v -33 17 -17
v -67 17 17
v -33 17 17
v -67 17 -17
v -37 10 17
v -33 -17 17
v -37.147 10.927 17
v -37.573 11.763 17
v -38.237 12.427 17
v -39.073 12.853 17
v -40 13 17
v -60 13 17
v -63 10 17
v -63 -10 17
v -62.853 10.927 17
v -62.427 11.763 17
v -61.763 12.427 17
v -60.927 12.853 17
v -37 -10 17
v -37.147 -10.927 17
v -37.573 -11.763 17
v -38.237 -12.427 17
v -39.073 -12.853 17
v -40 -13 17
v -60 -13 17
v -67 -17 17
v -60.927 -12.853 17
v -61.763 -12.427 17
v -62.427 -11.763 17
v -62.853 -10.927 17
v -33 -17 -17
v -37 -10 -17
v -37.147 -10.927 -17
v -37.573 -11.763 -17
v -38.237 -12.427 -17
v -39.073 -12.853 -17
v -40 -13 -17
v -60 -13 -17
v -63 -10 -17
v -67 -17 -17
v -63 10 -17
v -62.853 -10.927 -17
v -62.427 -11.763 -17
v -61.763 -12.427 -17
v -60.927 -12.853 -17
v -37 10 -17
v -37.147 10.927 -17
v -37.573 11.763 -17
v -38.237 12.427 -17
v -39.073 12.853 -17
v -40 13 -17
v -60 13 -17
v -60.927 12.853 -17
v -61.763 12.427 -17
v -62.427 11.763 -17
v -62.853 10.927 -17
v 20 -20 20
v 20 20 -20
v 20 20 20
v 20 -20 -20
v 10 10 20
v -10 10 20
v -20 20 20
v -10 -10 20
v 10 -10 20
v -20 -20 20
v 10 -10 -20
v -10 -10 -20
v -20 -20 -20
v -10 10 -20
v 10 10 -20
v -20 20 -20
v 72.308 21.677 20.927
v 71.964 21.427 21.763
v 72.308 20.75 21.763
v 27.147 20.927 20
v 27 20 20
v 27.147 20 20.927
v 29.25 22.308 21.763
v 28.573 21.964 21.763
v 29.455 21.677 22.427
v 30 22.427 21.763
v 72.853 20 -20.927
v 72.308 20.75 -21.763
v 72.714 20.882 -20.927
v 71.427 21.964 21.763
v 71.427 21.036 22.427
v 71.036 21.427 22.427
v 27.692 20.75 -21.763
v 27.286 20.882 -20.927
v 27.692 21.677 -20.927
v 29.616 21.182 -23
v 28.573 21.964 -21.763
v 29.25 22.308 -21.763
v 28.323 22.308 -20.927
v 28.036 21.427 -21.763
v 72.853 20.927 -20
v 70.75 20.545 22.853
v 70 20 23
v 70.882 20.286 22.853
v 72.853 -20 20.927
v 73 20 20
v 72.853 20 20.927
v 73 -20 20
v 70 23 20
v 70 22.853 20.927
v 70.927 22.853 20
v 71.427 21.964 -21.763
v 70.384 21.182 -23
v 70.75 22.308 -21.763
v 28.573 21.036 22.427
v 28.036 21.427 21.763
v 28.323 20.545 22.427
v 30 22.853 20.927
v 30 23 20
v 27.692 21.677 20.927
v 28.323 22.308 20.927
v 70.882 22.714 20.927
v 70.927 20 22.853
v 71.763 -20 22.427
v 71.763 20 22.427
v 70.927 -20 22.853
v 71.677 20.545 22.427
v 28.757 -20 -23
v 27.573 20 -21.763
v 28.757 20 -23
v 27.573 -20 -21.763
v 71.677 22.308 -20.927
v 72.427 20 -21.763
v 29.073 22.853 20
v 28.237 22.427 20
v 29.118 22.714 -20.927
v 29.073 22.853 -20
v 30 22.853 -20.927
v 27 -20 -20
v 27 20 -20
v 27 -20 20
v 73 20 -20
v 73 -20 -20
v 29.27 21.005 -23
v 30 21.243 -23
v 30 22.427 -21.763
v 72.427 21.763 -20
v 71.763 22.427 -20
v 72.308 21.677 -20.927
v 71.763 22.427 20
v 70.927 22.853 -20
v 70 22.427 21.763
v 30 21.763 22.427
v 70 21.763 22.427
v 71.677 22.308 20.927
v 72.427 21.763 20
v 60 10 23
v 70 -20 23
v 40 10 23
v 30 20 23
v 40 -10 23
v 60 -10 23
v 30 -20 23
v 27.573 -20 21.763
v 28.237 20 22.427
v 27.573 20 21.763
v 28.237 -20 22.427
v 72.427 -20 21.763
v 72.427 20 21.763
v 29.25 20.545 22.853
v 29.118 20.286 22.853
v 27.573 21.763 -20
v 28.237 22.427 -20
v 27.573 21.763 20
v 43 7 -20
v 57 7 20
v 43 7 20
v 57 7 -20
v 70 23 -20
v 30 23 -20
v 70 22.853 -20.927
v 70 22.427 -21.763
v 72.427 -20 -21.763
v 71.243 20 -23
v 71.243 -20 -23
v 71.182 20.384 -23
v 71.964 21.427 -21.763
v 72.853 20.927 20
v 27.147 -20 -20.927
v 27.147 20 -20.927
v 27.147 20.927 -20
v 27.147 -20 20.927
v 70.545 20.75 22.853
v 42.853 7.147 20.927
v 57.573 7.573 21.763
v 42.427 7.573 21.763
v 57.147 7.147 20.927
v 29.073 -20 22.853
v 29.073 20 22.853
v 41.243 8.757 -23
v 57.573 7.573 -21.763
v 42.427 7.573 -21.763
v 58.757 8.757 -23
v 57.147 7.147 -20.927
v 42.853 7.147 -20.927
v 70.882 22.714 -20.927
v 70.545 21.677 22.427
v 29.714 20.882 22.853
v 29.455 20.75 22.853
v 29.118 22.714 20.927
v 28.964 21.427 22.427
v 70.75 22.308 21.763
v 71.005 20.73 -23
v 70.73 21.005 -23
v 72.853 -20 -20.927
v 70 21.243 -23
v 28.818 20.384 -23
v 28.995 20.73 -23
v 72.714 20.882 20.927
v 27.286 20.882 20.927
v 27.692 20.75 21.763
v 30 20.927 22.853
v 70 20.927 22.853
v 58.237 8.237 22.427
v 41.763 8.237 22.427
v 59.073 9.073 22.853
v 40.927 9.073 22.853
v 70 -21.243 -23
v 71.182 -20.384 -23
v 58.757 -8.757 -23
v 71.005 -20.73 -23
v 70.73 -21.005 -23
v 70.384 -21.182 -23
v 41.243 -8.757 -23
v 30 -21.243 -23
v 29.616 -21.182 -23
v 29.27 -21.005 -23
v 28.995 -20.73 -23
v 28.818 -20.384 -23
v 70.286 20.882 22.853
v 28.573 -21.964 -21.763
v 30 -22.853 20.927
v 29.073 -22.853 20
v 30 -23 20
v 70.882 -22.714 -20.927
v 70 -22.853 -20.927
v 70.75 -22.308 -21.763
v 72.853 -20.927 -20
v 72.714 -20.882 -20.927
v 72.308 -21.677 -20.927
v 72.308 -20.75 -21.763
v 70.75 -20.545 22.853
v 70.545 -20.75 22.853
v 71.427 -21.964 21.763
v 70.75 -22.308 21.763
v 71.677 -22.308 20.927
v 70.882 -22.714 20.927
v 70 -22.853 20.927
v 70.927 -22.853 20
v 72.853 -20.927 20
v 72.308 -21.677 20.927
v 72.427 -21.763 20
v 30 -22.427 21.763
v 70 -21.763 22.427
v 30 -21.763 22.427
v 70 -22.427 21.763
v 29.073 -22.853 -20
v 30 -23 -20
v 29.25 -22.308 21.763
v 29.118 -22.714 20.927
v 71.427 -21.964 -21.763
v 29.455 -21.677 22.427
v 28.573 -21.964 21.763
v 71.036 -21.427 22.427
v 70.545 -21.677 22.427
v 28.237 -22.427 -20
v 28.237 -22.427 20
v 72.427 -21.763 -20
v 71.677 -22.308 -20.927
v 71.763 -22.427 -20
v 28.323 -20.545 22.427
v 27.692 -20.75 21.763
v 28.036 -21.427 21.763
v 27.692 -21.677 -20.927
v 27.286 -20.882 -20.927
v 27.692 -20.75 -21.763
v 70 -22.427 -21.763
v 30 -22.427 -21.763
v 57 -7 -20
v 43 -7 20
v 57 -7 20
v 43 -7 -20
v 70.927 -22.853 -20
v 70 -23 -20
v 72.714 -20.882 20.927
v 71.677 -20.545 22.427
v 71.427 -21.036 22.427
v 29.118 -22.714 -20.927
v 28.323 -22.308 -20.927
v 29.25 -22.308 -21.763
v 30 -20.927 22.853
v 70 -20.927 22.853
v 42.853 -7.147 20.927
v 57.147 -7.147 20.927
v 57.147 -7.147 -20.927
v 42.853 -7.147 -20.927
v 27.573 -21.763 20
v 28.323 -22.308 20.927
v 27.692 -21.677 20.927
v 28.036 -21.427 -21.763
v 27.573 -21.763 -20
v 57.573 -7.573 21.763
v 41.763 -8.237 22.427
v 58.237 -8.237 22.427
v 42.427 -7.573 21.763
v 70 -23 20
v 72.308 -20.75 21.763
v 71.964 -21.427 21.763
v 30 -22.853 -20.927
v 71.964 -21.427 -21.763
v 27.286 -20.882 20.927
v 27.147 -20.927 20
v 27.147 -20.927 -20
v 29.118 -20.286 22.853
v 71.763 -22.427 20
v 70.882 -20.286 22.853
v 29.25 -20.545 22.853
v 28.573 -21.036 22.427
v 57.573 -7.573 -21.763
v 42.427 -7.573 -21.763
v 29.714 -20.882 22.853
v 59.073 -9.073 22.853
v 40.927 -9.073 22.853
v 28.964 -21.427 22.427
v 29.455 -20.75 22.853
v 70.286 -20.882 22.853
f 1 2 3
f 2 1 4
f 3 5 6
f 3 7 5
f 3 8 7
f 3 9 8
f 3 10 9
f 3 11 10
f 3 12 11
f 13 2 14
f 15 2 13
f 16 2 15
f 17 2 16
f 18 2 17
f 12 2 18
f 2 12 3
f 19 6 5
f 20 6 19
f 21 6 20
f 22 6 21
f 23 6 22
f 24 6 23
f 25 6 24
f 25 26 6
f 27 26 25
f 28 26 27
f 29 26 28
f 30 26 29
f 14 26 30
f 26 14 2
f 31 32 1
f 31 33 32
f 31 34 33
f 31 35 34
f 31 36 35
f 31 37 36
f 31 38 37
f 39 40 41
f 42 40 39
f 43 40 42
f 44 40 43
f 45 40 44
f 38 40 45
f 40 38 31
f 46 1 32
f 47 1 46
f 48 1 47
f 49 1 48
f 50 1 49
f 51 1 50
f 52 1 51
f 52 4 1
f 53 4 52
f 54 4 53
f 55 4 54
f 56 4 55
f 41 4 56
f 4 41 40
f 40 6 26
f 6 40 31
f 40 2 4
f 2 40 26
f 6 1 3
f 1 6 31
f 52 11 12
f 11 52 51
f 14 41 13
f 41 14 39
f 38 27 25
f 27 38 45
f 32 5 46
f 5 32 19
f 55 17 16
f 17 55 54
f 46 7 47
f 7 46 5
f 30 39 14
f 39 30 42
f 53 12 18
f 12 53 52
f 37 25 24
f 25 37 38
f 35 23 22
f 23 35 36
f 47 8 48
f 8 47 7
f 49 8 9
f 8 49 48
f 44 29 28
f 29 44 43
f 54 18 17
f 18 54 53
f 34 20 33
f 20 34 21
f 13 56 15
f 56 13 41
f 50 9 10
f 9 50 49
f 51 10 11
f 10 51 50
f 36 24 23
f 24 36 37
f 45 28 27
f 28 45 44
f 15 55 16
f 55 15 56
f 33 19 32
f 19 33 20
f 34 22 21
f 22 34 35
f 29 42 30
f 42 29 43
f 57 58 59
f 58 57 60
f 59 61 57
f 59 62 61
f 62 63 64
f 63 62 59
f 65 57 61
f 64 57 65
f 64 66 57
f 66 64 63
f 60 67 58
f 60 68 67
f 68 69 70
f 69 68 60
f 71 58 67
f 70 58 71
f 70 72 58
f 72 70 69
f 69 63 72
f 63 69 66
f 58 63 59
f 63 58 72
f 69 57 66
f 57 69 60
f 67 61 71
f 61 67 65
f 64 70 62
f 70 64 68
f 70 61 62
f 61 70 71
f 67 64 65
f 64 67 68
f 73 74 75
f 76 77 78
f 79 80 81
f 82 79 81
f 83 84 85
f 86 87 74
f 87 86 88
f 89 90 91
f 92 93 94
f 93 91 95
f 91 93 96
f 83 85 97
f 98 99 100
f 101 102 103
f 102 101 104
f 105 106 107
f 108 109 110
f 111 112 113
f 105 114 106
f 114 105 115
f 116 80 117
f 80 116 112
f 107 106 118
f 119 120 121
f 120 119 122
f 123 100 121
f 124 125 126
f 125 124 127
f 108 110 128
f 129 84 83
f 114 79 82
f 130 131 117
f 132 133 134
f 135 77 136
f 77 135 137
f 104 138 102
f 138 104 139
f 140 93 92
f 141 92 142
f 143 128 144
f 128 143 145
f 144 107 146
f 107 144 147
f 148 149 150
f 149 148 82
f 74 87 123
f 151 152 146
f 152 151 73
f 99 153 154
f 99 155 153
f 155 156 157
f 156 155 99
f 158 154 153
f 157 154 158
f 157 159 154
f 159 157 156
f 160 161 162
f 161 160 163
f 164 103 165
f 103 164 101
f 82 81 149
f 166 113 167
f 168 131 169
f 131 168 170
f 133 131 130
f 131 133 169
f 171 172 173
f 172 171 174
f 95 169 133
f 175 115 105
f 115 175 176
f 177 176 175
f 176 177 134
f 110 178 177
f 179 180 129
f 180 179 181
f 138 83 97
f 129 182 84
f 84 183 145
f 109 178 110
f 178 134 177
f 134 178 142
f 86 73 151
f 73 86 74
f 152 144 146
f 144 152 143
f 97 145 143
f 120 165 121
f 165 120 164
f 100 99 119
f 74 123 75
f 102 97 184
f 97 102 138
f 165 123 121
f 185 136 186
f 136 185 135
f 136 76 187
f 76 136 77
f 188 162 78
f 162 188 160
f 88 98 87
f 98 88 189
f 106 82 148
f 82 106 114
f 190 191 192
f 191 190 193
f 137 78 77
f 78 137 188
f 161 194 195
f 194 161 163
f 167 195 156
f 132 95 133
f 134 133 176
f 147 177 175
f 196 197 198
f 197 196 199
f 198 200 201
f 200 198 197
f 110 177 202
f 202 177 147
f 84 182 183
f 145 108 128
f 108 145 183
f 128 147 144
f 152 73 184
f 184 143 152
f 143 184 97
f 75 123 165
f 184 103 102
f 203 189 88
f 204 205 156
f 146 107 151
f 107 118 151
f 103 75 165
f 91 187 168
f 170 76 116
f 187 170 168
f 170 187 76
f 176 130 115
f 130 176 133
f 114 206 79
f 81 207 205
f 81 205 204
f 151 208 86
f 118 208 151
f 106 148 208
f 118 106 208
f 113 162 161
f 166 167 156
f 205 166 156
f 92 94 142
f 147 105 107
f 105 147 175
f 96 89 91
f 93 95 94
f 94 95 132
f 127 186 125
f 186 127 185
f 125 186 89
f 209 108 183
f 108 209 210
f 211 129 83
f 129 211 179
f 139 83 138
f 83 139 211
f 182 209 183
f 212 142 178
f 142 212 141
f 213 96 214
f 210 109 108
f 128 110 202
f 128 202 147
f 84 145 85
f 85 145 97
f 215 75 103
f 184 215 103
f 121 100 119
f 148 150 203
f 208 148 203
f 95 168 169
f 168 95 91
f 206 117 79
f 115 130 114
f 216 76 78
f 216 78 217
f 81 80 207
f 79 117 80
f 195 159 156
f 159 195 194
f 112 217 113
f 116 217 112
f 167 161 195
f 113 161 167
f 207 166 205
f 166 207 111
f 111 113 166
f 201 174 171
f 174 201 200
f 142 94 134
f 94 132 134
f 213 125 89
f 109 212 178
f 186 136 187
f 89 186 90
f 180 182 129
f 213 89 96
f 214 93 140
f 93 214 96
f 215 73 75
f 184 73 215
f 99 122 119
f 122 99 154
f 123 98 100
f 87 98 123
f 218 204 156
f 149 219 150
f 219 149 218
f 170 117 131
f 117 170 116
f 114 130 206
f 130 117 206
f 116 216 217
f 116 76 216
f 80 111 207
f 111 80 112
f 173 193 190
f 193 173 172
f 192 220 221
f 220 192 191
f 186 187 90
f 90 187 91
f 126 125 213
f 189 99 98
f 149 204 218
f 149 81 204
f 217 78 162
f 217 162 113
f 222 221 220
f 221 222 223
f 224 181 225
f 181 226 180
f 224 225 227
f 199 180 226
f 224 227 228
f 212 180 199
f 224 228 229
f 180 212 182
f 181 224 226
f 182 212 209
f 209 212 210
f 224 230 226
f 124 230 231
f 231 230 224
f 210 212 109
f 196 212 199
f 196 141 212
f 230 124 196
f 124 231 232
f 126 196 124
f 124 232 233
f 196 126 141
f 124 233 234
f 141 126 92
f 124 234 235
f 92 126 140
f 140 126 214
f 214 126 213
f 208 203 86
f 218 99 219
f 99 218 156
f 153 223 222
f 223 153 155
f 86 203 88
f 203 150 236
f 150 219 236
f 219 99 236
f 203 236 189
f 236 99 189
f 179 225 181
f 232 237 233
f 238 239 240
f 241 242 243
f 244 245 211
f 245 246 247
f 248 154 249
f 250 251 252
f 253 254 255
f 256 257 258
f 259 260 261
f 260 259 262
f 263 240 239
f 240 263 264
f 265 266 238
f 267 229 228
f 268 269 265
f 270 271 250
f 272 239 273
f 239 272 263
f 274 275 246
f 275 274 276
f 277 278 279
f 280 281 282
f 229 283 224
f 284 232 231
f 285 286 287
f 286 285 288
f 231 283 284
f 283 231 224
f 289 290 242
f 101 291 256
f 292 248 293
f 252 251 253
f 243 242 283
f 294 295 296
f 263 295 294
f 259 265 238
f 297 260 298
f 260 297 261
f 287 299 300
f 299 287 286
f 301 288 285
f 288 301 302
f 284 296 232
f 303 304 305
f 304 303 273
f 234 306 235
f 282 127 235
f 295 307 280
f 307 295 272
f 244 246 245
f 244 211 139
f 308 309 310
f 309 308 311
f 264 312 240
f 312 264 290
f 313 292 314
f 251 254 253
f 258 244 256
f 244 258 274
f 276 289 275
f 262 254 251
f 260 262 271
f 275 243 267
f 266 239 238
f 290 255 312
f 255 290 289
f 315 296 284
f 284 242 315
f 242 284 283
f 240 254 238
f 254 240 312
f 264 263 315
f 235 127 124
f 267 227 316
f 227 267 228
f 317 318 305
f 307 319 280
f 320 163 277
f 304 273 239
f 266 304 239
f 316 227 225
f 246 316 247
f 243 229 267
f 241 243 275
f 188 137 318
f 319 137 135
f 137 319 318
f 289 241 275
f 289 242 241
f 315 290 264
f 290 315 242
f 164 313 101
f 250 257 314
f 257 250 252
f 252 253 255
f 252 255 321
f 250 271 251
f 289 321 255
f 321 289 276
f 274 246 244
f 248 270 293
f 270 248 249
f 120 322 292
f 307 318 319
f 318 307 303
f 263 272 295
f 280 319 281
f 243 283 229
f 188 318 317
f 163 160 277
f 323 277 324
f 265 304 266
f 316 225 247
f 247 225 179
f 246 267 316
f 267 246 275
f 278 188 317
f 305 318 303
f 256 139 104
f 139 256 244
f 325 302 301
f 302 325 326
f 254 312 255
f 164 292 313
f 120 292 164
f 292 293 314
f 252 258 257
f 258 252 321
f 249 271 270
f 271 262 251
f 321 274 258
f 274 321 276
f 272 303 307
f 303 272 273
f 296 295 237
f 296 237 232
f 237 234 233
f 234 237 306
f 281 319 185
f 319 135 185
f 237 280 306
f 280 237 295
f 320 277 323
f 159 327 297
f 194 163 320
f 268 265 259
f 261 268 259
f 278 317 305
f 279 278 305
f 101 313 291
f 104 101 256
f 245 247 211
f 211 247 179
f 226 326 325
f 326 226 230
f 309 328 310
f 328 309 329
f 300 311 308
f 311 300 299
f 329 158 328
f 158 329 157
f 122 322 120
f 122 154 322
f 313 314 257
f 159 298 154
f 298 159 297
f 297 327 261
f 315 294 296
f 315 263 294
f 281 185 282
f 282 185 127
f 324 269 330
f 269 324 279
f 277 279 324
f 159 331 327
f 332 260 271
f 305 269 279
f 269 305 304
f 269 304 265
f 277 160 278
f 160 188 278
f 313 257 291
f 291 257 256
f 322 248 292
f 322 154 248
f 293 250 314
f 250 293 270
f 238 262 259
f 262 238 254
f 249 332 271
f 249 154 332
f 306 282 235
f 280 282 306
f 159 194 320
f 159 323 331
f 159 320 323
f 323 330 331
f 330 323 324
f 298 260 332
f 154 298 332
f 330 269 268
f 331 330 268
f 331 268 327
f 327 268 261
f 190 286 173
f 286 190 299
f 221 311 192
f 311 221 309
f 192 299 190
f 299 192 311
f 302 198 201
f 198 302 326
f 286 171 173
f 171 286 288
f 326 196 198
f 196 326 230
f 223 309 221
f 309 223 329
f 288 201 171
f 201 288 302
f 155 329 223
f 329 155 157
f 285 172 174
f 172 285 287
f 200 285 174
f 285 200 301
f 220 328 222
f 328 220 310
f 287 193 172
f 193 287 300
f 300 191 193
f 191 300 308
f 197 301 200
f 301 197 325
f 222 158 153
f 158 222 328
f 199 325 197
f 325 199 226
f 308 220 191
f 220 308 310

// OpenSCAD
// file: ../utils/core/clip.scad
//
// NopSCADlib Copyright Chris Palmer 2018
// nop.head@gmail.com
// hydraraptor.blogspot.com
//
// This file is part of NopSCADlib.
//
// NopSCADlib is free software: you can redistribute it and/or modify it under the terms of the
// GNU General Public License as published by the Free Software Foundation, either version 3 of
// the License, or (at your option) any later version.
//
// NopSCADlib is distributed in the hope that it will be useful, but WITHOUT ANY WARRANTY;
// without even the implied warranty of MERCHANTABILITY or FITNESS FOR A PARTICULAR PURPOSE.
// See the GNU General Public License for more details.
//
// You should have received a copy of the GNU General Public License along with NopSCADlib.
// If not, see <https://www.gnu.org/licenses/>.
//

//
//! Construct arbirarily large box to partition 3D space and clip objects, useful for creating cross sections to see the inside when debugging.
//!
//! Original version by Doug Moen on the OpenSCAD forum
//
//
module box(xmin, ymin, zmin, xmax, ymax, zmax) //! Construct a box given its bounds
    polyhedron(
        [[xmin, ymin, zmin],  // 0
         [xmin, ymin, zmax],  // 1
         [xmin, ymax, zmin],  // 2
         [xmin, ymax, zmax],  // 3
         [xmax, ymin, zmin],  // 4
         [xmax, ymin, zmax],  // 5
         [xmax, ymax, zmin],  // 6
         [xmax, ymax, zmax]], // 7
        [[7,5,1,3],  // top
         [2,0,4,6],  // bottom
         [5,4,0,1],  // front
         [3,2,6,7],  // back
         [5,7,6,4],  // right
         [0,2,3,1]]  // left
    );

module clip(xmin = -inf, ymin = -inf, zmin = -inf, xmax = inf, ymax = inf, zmax = inf) //! Clip child to specified boundaries
    render() intersection() {
        children();

        box(xmin, ymin, zmin, xmax, ymax, zmax);
    }
// file: ../utils/core/rounded_rectangle.scad
//
// NopSCADlib Copyright Chris Palmer 2018
// nop.head@gmail.com
// hydraraptor.blogspot.com
//
// This file is part of NopSCADlib.
//
// NopSCADlib is free software: you can redistribute it and/or modify it under the terms of the
// GNU General Public License as published by the Free Software Foundation, either version 3 of
// the License, or (at your option) any later version.
//
// NopSCADlib is distributed in the hope that it will be useful, but WITHOUT ANY WARRANTY;
// without even the implied warranty of MERCHANTABILITY or FITNESS FOR A PARTICULAR PURPOSE.
// See the GNU General Public License for more details.
//
// You should have received a copy of the GNU General Public License along with NopSCADlib.
// If not, see <https://www.gnu.org/licenses/>.
//

//
//! Rectangle with rounded corners.
//
module rounded_square(size, r, center = true) //! Like ```square()``` but with with rounded corners
{
    $fn = r2sides4n(r);
    offset(r) offset(-r) square(size, center = center);
}

module rounded_rectangle(size, r, center = true, xy_center = true) //! Like ```cube()``` but corners rounded in XY plane and separate centre options for xy and z.
{
    linear_extrude(height = size[2], center = center)
        rounded_square([size[0], size[1]], r, xy_center);
}
// file: ../utils/core/teardrops.scad
//
// NopSCADlib Copyright Chris Palmer 2018
// nop.head@gmail.com
// hydraraptor.blogspot.com
//
// This file is part of NopSCADlib.
//
// NopSCADlib is free software: you can redistribute it and/or modify it under the terms of the
// GNU General Public License as published by the Free Software Foundation, either version 3 of
// the License, or (at your option) any later version.
//
// NopSCADlib is distributed in the hope that it will be useful, but WITHOUT ANY WARRANTY;
// without even the implied warranty of MERCHANTABILITY or FITNESS FOR A PARTICULAR PURPOSE.
// See the GNU General Public License for more details.
//
// You should have received a copy of the GNU General Public License along with NopSCADlib.
// If not, see <https://www.gnu.org/licenses/>.
//

//
//! For making horizontal holes that don't need support material.
//! Small holes can get away without it, but they print better with truncated teardrops.
//
module teardrop(h, r, center = true, truncate = true) //! For making horizontal holes that don't need support material, set ```truncate = false``` to make traditional RepRap teardrops that don't even need bridging
    render(convexity = 5)
        extrude_if(h, center)
           hull() {
                circle4n(r);

                if(truncate)
                    translate([0, r / 2])
                        square([2 * r * (sqrt(2) - 1), r], center = true);
                else
                    polygon([[0, 0], [eps, 0], [0, r * sqrt(2)]]);
            }

module teardrop_plus(h, r, center = true, truncate = true) //! Slightly bigger teardrop to allow for the 3D printing staircase effect
    teardrop(h, r + layer_height / 4, center, truncate);

module tearslot(h, r, w, center = true) //! A horizontal slot that doesn't need support material
    extrude_if(h, center)
        hull() {
            translate([-w/2,0,0]) teardrop(r = r, h = 0);
            translate([ w/2,0,0]) teardrop(r = r, h = 0);
        }

module vertical_tearslot(h, r, l, center = true) //! A vertical slot that doesn't need support material
    extrude_if(h, center)
        hull() {
            translate([0,  l / 2]) teardrop(0, r, true);
            translate([0, -l / 2])
                circle4n(r);
        }
// file: ../utils/core/polyholes.scad
//
// NopSCADlib Copyright Chris Palmer 2018
// nop.head@gmail.com
// hydraraptor.blogspot.com
//
// This file is part of NopSCADlib.
//
// NopSCADlib is free software: you can redistribute it and/or modify it under the terms of the
// GNU General Public License as published by the Free Software Foundation, either version 3 of
// the License, or (at your option) any later version.
//
// NopSCADlib is distributed in the hope that it will be useful, but WITHOUT ANY WARRANTY;
// without even the implied warranty of MERCHANTABILITY or FITNESS FOR A PARTICULAR PURPOSE.
// See the GNU General Public License for more details.
//
// You should have received a copy of the GNU General Public License along with NopSCADlib.
// If not, see <https://www.gnu.org/licenses/>.
//

//
//! A method of making 3D printed holes come out the right size regardless of the printer, providing
//! it gets the linear dimensions right. See <https://hydraraptor.blogspot.com/2011/02/polyholes.html>
//!
//! The module provides `poly_circle()`, `poly_cylinder()` and `poly_ring()` that is useful for making printed washers and pillars.
//
function sides(r) = max(round(4 * r), 3); //! Optimium number of sides for specified radius
function corrected_radius(r, n = 0)   = r / cos(180 / (n ? n : sides(r))); //! Adjusted radius to make flats lie on the circle
function corrected_diameter(d, n = 0) = d / cos(180 / (n ? n : sides(d / 2))); //! Adjusted diameter to make flats lie on the circle

module poly_circle(r, sides = 0) { //! Make a circle adjusted to print the correct size
    n = sides ? sides : sides(r);
    circle(r = corrected_radius(r,n), $fn = n);
}

module poly_cylinder(r, h, center = false, sides = 0) //! Make a cylinder adjusted to print the correct size
    extrude_if(h, center)
        poly_circle(r, sides);

module poly_ring(or, ir) { //! Make a 2D ring adjusted to have the correct internal radius
    cir = corrected_radius(ir);
    filaments = floor((or - cir) / extrusion_width);
    if(filaments > 3)
        difference() {
            circle(or);

            poly_circle(ir);
        }
    else
        if(filaments >= 2)
            difference() {
                offset(or - cir)
                    poly_circle(ir);

                poly_circle(ir);
            }
            else
                difference() {
                    poly_circle(or);

                    offset(-squeezed_wall)
                        poly_circle(or);
                }
}

module drill(r, h = 100) //! Make a cylinder for drilling holes suitable for CNC routing, set h = 0 for circle
    extrude_if(h)
        circle(r = corrected_radius(r, r2sides(r)));
//
// Horizontal slot
//
module slot(r, l, h = 100) //! Make a horizontal slot suitable for CNC routing, set h = 0 for 2D version
    extrude_if(h)
        hull() {
            translate([l / 2,0])
                drill(r, 0);

            translate([-l / 2,0])
                drill(r, 0);
        }
// file: ../utils/core/bom.scad
//
// NopSCADlib Copyright Chris Palmer 2018
// nop.head@gmail.com
// hydraraptor.blogspot.com
//
// This file is part of NopSCADlib.
//
// NopSCADlib is free software: you can redistribute it and/or modify it under the terms of the
// GNU General Public License as published by the Free Software Foundation, either version 3 of
// the License, or (at your option) any later version.
//
// NopSCADlib is distributed in the hope that it will be useful, but WITHOUT ANY WARRANTY;
// without even the implied warranty of MERCHANTABILITY or FITNESS FOR A PARTICULAR PURPOSE.
// See the GNU General Public License for more details.
//
// You should have received a copy of the GNU General Public License along with NopSCADlib.
// If not, see <https://www.gnu.org/licenses/>.
//

//
//! Bill Of Materials generation via echo and the ```bom.py``` script. Also handles exploded assembly views and posing. Assembly instructions can precede the module
//! definition that makes the assembly.
//!
//! The example below shows how to define a vitamin and incorporate it into an assembly with sub-assemblies and make an exploded view. The resulting flat BOM is shown but
//! heirachical BOMs are also generated for real projects.
//
function bom_mode(n = 1) = $_bom >= n && (is_undef($on_bom) || $on_bom);  //! Current BOM mode, 0 = none, 1 = printed and routed parts and assemblies, 2 includes vitamins as well
function exploded() = is_undef($exploded_parent) ? $exploded : 0;   //! Returns the value of ```$exploded``` if it is defined, else ```0```
function show_supports() = !$preview || exploded();                 //! True if printed support material should be shown

module no_explode() let($exploded_parent = true) children();        //! Prevent children being exploded
module no_pose() let($posed = true) children();                     //! Force children not to be posed even if parent is

module explode(d, explode_children = false, offset = [0,0,0]) {     //! Explode children by specified Z distance or vector ```d```, option to explode grand children
    v = is_list(d) ? d : [0, 0, d];
    o = is_list(offset) ? offset : [0, 0, offset];
    if($exploded && is_undef($exploded_parent)) {
        translate(o)                                                // Draw the line first in case the child is transparent
            hull() {
                sphere(0.2);

                translate(v * $exploded)
                    sphere(0.2);
            }

        translate(v * $exploded)
            let($exploded_parent = explode_children ? undef : true)
                children();
    }
    else
        children();
}

module pose(a = [55, 0, 25], t = [0, 0, 0], exploded = undef)       //! Pose an STL or assembly for rendering to png by specifying rotation ```a``` and translation ```t```, ```exploded = true for``` just the exploded view or ```false``` for unexploded only.
    if(is_undef($pose) || !is_undef($posed) || (!is_undef(exploded) && exploded != !!exploded()))
        children();
    else
        let($posed = true) // only pose the top level
            rotate([55, 0, 25])
                rotate([-a.x, 0, 0])
                    rotate([0, -a.y, 0])
                        rotate([0, 0, -a.z])
                            translate(-t)
                                children();


module assembly(name) {                 //! Name an assembly that will appear on the BOM, there needs to a module named ```<name>_assembly``` to make it
    if(bom_mode())
        echo(str("~", name, "_assembly{"));

    no_pose()
        if(is_undef($child_assembly))
            let($child_assembly = true)
                children();
        else
            no_explode()
                children();

    if(bom_mode())
        echo(str("~}", name, "_assembly"));
}

module stl(name) {                      //! Name an stl that will appear on the BOM, there needs to a module named ```<name>_stl``` to make it
    if(bom_mode())
        echo(str("~", name, ".stl"));
}

module dxf(name) {                      //! Name a dxf that will appear on the BOM, there needs to a module named ```<name>_dxf``` to make it
    if(bom_mode())
        echo(str("~", name, ".dxf"));
}

function value_string(value) = is_string(value) ? str("\"", value, "\"") : str(value); //! Convert ```value``` to a string or quote it if it is already a string

function arg(value, default, name = "") =   //! Create string for arg if not default, helper for ```vitamin()```
    value == default ? ""
                     : name ? str(", ", name, " = ", value_string(value))
                            : str(", ", value_string(value));

module vitamin(description) {                //! Describe a vitamin for the BOM entry and precede it with a module call that creates it, eg. "wigit(42): Type 42 widget"
    if(bom_mode(2))
        echo(str("~", description, !is_undef($hidden) ? " - not shown" : ""));
}

module not_on_bom(on = false)               //! Specify the following child parts are not on the BOM, for example when they are on a PCB that comes assembled
    let($on_bom = on)
        children();

module hidden()                             //! Make item invisible, except on the BOM
    scale(1 / sqr(1024))
        let($hidden = true)
            children();
// file: ../utils/core/sphere.scad
//
// NopSCADlib Copyright Chris Palmer 2018
// nop.head@gmail.com
// hydraraptor.blogspot.com
//
// This file is part of NopSCADlib.
//
// NopSCADlib is free software: you can redistribute it and/or modify it under the terms of the
// GNU General Public License as published by the Free Software Foundation, either version 3 of
// the License, or (at your option) any later version.
//
// NopSCADlib is distributed in the hope that it will be useful, but WITHOUT ANY WARRANTY;
// without even the implied warranty of MERCHANTABILITY or FITNESS FOR A PARTICULAR PURPOSE.
// See the GNU General Public License for more details.
//
// You should have received a copy of the GNU General Public License along with NopSCADlib.
// If not, see <https://www.gnu.org/licenses/>.
//

//! Redefines `sphere()` to always have a vertex on all six half axes I.e. vertices at the poles and the equator and `$fn` a multiple of four.
//! This ensures `hull` and `minkowski` results have the correct dimensions when spheres are placed at the corners.

module sphere(r = 1, d = undef) {                   //! Override ```sphere``` so that has vertices on all three axes. Has the advantage of giving correct dimensions when hulled
    R = is_undef(d) ? r : d / 2;
    rotate_extrude($fn = r2sides4n(R))
        rotate(-90)
            semi_circle(R);
}
// file: ../utils/core/global.scad
//
// NopSCADlib Copyright Chris Palmer 2018
// nop.head@gmail.com
// hydraraptor.blogspot.com
//
// This file is part of NopSCADlib.
//
// NopSCADlib is free software: you can redistribute it and/or modify it under the terms of the
// GNU General Public License as published by the Free Software Foundation, either version 3 of
// the License, or (at your option) any later version.
//
// NopSCADlib is distributed in the hope that it will be useful, but WITHOUT ANY WARRANTY;
// without even the implied warranty of MERCHANTABILITY or FITNESS FOR A PARTICULAR PURPOSE.
// See the GNU General Public License for more details.
//
// You should have received a copy of the GNU General Public License along with NopSCADlib.
// If not, see <https://www.gnu.org/licenses/>.
//

//
//! Global constants, functions and modules. This file is used directly or indirectly in every scad file.
//
include <../../global_defs.scad>

function sqr(x) = x * x;                                                            //! Returns the square of ```x```
function inch(x) = x * 25.4;                                                        //! Inch to mm conversion
function echoit(x) = echo(x) x;                                                     //! Echo expression and return it, useful for debugging
function in(list, x) = !!len([for(v = list) if(v == x) true]);                      //! Returns true if ```x``` is an element in the ```list```
function Len(x) = is_list(x) ? len(x) : 0;                                          //! Returns the length of a list or 0 if ```x``` is not a list
function r2sides(r) = $fn ? $fn : ceil(max(min(360/ $fa, r * 2 * PI / $fs), 5));    //! Replicates the OpenSCAD logic to calculate the number of sides from the radius
function r2sides4n(r) = floor((r2sides(r) + 3) / 4) * 4;                            //! Round up the number of sides to a multiple of 4 to ensure points land on all axes

module translate_z(z) translate([0, 0, z]) children();                              //! Shortcut for Z only translations
module vflip() rotate([180, 0, 0]) children();                                      //! Invert children by doing a 180 flip around the X axis
module ellipse(xr, yr) scale([1, yr / xr]) circle4n(xr);                            //! Draw an ellipse

module extrude_if(h, center = true)                 //! Extrudes 2D object to 3D when ```h``` is nonzero, otherwise leaves it 2D
    if(h)
        linear_extrude(height = h, center = center) // 3D
            children();
    else
        children();                                 // 2D

module circle4n(r, d = undef) {                     //! Circle with multiple of 4 vertices
    R = is_undef(d) ? r : d / 2;
    circle(R, $fn = r2sides4n(R));
}

module semi_circle(r, d = undef)                    //! A semi circle in the positive Y domain
    intersection() {
        R = is_undef(d) ? r : d / 2;
        circle4n(R);

        sq = R + 1;
        translate([-sq, 0])
            square([2 * sq, sq]);
    }

include <sphere.scad>
include <bom.scad>
include <polyholes.scad>
include <teardrops.scad>
include <rounded_rectangle.scad>
include <clip.scad>
// file: ../global_defs.scad
//
// NopSCADlib Copyright Chris Palmer 2018
// nop.head@gmail.com
// hydraraptor.blogspot.com
//
// This file is part of NopSCADlib.
//
// NopSCADlib is free software: you can redistribute it and/or modify it under the terms of the
// GNU General Public License as published by the Free Software Foundation, either version 3 of
// the License, or (at your option) any later version.
//
// NopSCADlib is distributed in the hope that it will be useful, but WITHOUT ANY WARRANTY;
// without even the implied warranty of MERCHANTABILITY or FITNESS FOR A PARTICULAR PURPOSE.
// See the GNU General Public License for more details.
//
// You should have received a copy of the GNU General Public License along with NopSCADlib.
// If not, see <https://www.gnu.org/licenses/>.
//

//
// This file included directly or indirectly in every scad file.
//
// This scheme allows the following:
//  bom defaults to 0
//  Setting $bom on the command line or in the main file before including lib.scad overrides it everywhere.
//  Setting $bom after including lib overrides bom in the libs but not in the local file.
//  Setting $_bom in the local file overrides it in the local file but not in the libs.
//
//function is_undef(x) = x == undef;

$_bom           = is_undef($bom)             ? 0      : $bom;             // 0 no bom, 1 assemblies and stls, 2 vitamins as well
$exploded       = is_undef($explode)         ? 0      : $explode;         // 1 for exploded view
layer_height    = is_undef($layer_height)    ? 0.25   : $layer_height;    // layer heigth when printing
extrusion_width = is_undef($extrusion_width) ? 0.5    : $extrusion_width; // filament width when printing
nozzle          = is_undef($nozzle)          ? 0.45   : $nozzle;          // 3D printer nozzle
cnc_bit_r       = is_undef($cnc_bit_r)       ? 1.2    : $cnc_bit_r;       // miniumum tool radius when milling 2D objects
pp1_colour      = is_undef($pp1_colour)      ? "lime" : $pp1_colour;      // printed part colour 1
pp2_colour      = is_undef($pp2_colour)      ? "red"  : $pp2_colour;      // printed part colour 2
pp3_colour      = is_undef($pp3_colour)      ? "blue" : $pp3_colour;      // printed part colour 3
pp4_colour      = is_undef($pp4_colour)      ? "darkorange" : $pp4_colour;// printed part colour 4
show_rays       = is_undef($show_rays)       ? false  : $show_rays;       // show camera sight lines and light direction

// Minimum wall is about two filaments wide but we extrude it closer to get better bonding
squeezed_wall = $preview ? 2 * extrusion_width - layer_height * (1 - PI / 4)
                         : extrusion_width - layer_height / 2 + nozzle / 2 + extrusion_width / 2;

inf = 1e10;      // very big
eps = 1/128;     // small fudge factor to stop CSG barfing on coincident faces.
$fa = 6;
$fs = extrusion_width / 2;

function round_to_layer(z) = ceil(z / layer_height) * layer_height;
// Some additional named colors
grey20                          = [0.2, 0.2, 0.2];
grey30                          = [0.3, 0.3, 0.3];
grey40                          = [0.4, 0.4, 0.4];
grey50                          = [0.5, 0.5, 0.5];
grey60                          = [0.6, 0.6, 0.6];
grey70                          = [0.7, 0.7, 0.7];
grey80                          = [0.8, 0.8, 0.8];
grey90                          = [0.9, 0.9, 0.9];
brass                           = "gold";

/*
 * Enums
 */
//
// Screws
//
hs_cap    = 0;
hs_pan    = 1;
hs_cs     = 2;     // counter sunk
hs_hex    = 3;
hs_grub   = 4;     // pulley set screw
hs_cs_cap = 5;
hs_dome   = 6;
//
// Hot end descriptions
//
jhead   = 1;
e3d     = 2;
//
// Face enumeration
//
f_bottom = 0;
f_top    = 1;
f_left   = 2;
f_right  = 3;
f_front  = 4;
f_back   = 5;
// file: ../utils/offset.scad
//
// NopSCADlib Copyright Chris Palmer 2018
// nop.head@gmail.com
// hydraraptor.blogspot.com
//
// This file is part of NopSCADlib.
//
// NopSCADlib is free software: you can redistribute it and/or modify it under the terms of the
// GNU General Public License as published by the Free Software Foundation, either version 3 of
// the License, or (at your option) any later version.
//
// NopSCADlib is distributed in the hope that it will be useful, but WITHOUT ANY WARRANTY;
// without even the implied warranty of MERCHANTABILITY or FITNESS FOR A PARTICULAR PURPOSE.
// See the GNU General Public License for more details.
//
// You should have received a copy of the GNU General Public License along with NopSCADlib.
// If not, see <https://www.gnu.org/licenses/>.
//

//! 3D offset using `minkowski` with a `sphere`, so very slow if `$fn` is not kept small. The offset can be positive or negative.
//!
//! Can be used to round corners. Positive offsets will round convex corners, negative offsets round concave corners. To round both use [`round_3D()`](#round).
//!
//! If `chamfer_base` is true then the bottom edge is made suitable for 3D printing by chamfering when the angle gets shallower than 45 degrees.
include <../core.scad>

module offset_3D(r, chamfer_base = false) { //! Offset 3D shape by specified radius ```r```, positive or negative.
    module ball(r)
        if(chamfer_base)
            rotate_extrude()
                intersection() {
                    rotate(180)
                        teardrop(0, r);

                    translate([0, -r])
                        square([r, 2 * r]);
                }
        else
            sphere(r);

    if(r > 0)
        minkowski() {
            children();

            ball(r);
        }
    else
        if(r < 0)
            render() difference() {
                cube(inf / 2, center = true);

                minkowski() {
                    difference() {
                        cube(inf, center = true);

                        children();
                    }
                    ball(-r);
                }
            }
        else
            children();
}
// file: ../core.scad
//
// NopSCADlib Copyright Chris Palmer 2018
// nop.head@gmail.com
// hydraraptor.blogspot.com
//
// This file is part of NopSCADlib.
//
// NopSCADlib is free software: you can redistribute it and/or modify it under the terms of the
// GNU General Public License as published by the Free Software Foundation, either version 3 of
// the License, or (at your option) any later version.
//
// NopSCADlib is distributed in the hope that it will be useful, but WITHOUT ANY WARRANTY;
// without even the implied warranty of MERCHANTABILITY or FITNESS FOR A PARTICULAR PURPOSE.
// See the GNU General Public License for more details.
//
// You should have received a copy of the GNU General Public License along with NopSCADlib.
// If not, see <https://www.gnu.org/licenses/>.
//

//
// Include this file to use the library
//
include <global_defs.scad>
//
// Global functions and modules
//
use <utils/core/global.scad>
// main file
//
// NopSCADlib Copyright Chris Palmer 2018
// nop.head@gmail.com
// hydraraptor.blogspot.com
//
// This file is part of NopSCADlib.
//
// NopSCADlib is free software: you can redistribute it and/or modify it under the terms of the
// GNU General Public License as published by the Free Software Foundation, either version 3 of
// the License, or (at your option) any later version.
//
// NopSCADlib is distributed in the hope that it will be useful, but WITHOUT ANY WARRANTY;
// without even the implied warranty of MERCHANTABILITY or FITNESS FOR A PARTICULAR PURPOSE.
// See the GNU General Public License for more details.
//
// You should have received a copy of the GNU General Public License along with NopSCADlib.
// If not, see <https://www.gnu.org/licenses/>.
//

include <../core.scad>
use <../utils/offset.scad>

module shape()
    difference() {
        cube(40, center = true);

        cube([20, 20, 41], center = true);
    }

module offsets() {
    $fn = 20;

    for(x = [-1, 0, 1])
        translate([50 * x, 0])
            offset_3D(3 * x, chamfer_base = true)
                shape();
}

offsets();
